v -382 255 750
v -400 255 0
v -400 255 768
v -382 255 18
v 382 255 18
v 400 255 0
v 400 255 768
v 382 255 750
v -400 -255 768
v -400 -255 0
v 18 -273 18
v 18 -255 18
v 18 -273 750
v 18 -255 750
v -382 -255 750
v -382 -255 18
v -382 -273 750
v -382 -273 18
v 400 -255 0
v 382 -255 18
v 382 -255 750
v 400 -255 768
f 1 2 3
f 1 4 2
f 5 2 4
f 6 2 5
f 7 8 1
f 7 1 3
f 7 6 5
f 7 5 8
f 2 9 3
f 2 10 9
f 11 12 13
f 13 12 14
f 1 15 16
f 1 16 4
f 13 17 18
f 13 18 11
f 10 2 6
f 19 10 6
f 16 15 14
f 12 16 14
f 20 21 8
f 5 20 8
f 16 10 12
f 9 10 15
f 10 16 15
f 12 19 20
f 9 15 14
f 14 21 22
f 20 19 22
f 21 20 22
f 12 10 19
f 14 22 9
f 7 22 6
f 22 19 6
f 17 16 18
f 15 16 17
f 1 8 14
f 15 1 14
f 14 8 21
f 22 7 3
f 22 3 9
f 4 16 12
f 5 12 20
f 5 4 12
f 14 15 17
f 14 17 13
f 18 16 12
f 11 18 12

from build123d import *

# Parameters (mm, degrees)
F0_W     = 800
F0_H     = 510
F1_DEPTH = 18
F2_W     = 18
F2_H     = 510
F3_DEPTH = 750
F4_W     = 18
F4_H     = 510
F5_DEPTH = 750
F6_W     = 510
F6_H     = 18
F7_DEPTH = 764
F8_W     = 400
F8_H     = 732
F9_DEPTH = 17.9999992251


with BuildPart() as f1:
    # F0 (on Top) → F1 (new body)
    with BuildSketch(Plane.XY):
        Rectangle(F0_W, F0_H)
    extrude(amount=F1_DEPTH)

    # F2 (on face) → F3 (join)
    with BuildSketch(Plane.XY.offset(18)):
        with Locations((-391, 0)):
            Rectangle(F2_W, F2_H)
    extrude(amount=F3_DEPTH)

    # F4 (on face) → F5 (join)
    with BuildSketch(Plane.XY.offset(18)):
        with Locations((391, 0)):
            Rectangle(F4_W, F4_H)
    extrude(amount=F5_DEPTH)

    # F6 (on face) → F7 (join)
    with BuildSketch(Plane(origin=(382, 0, 0), x_dir=(0, -1, 0), z_dir=(-1, 0, 0))):
        with Locations((0, 759)):
            Rectangle(F6_W, F6_H)
    extrude(amount=F7_DEPTH)

    # F8 (on face) → F9 (join)
    with BuildSketch(Plane.XZ.offset(255)):
        with Locations((-182, 384)):
            Rectangle(F8_W, F8_H)
    extrude(amount=F9_DEPTH)


solid = f1.part
